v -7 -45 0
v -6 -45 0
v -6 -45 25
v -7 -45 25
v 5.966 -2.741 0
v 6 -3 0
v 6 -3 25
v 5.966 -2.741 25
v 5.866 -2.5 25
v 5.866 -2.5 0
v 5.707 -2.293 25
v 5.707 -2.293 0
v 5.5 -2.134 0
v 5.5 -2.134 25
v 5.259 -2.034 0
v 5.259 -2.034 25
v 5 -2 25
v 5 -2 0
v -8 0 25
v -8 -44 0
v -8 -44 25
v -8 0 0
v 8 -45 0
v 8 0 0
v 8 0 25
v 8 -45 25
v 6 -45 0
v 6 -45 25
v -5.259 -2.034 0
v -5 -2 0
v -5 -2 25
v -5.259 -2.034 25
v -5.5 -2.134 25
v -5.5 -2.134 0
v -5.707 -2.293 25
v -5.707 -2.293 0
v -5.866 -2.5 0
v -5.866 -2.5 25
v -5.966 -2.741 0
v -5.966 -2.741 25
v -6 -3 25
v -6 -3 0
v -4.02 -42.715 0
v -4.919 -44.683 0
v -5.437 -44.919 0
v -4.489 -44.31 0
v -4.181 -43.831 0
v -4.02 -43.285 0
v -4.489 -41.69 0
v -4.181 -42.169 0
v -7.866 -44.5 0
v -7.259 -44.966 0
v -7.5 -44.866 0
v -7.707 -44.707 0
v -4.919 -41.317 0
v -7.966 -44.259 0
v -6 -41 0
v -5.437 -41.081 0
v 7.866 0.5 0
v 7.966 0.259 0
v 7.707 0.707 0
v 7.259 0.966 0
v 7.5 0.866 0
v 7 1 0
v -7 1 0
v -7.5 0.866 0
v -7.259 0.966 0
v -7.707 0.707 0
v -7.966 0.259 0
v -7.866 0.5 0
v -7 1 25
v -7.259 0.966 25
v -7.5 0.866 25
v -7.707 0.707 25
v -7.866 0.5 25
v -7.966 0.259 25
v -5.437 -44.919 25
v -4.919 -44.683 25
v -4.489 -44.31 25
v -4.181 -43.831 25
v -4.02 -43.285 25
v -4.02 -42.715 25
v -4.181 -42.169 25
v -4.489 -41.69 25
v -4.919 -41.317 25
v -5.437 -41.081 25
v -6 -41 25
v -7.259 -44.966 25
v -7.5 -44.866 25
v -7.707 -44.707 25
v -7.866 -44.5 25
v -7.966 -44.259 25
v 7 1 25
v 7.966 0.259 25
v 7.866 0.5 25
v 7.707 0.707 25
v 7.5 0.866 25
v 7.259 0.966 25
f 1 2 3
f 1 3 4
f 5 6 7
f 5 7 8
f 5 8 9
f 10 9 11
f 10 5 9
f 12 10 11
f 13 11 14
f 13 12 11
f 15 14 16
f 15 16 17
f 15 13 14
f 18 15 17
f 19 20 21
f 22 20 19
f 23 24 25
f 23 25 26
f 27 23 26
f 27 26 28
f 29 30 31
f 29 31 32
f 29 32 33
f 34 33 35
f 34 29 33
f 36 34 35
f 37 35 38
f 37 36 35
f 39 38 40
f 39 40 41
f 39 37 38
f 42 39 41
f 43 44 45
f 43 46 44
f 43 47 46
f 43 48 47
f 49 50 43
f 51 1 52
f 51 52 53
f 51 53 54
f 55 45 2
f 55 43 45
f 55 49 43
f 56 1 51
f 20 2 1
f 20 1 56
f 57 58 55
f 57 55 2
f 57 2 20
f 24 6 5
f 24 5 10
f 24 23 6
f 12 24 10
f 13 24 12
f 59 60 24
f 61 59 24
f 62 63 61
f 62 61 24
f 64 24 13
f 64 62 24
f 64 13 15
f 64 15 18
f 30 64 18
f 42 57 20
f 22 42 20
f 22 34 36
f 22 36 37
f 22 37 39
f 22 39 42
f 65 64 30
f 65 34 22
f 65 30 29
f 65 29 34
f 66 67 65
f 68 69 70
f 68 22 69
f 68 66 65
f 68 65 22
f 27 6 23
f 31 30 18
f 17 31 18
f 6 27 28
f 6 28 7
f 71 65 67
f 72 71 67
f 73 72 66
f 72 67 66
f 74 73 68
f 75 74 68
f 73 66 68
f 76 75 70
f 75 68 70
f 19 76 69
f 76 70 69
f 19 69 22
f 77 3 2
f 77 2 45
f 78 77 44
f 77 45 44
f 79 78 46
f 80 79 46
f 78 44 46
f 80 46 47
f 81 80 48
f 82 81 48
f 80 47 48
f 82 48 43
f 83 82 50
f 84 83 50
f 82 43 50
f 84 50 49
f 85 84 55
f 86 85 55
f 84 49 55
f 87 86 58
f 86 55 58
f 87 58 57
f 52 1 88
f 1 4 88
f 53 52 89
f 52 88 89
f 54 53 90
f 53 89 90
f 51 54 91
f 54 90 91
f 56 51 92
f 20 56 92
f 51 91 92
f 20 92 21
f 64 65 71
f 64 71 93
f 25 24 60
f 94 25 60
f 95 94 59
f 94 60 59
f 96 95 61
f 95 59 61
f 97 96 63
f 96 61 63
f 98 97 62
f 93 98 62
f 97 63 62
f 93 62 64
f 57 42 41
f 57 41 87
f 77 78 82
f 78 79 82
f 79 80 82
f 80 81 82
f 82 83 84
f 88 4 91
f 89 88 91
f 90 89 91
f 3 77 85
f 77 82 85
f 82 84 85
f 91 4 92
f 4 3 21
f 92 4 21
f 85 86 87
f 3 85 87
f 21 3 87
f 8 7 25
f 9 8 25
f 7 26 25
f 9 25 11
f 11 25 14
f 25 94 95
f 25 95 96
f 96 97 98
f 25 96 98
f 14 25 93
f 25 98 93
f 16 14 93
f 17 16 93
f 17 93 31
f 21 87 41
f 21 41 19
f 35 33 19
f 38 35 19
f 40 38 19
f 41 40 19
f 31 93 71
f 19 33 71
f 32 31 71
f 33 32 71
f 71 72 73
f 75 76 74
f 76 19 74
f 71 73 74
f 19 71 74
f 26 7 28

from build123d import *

# Parameters (mm, degrees)
PAD_DEPTH = 25
FILLET_R  = 1


with BuildPart() as part:
    # Sketch → Pad (new body)
    with BuildSketch(Plane.XY):
        with BuildLine():
            Line((8, 0), (8, -45))
            Line((8, -45), (6, -45))
            Line((6, -45), (6, -3))
            ThreePointArc((6, -3), (5.707107, -2.292893), (5, -2))
            Line((-5, -2), (5, -2))
            ThreePointArc((-5, -2), (-5.707107, -2.292893), (-6, -3))
            Line((-6, -3), (-6, -41))
            ThreePointArc((-6, -45), (-4, -43), (-6, -41))
            Line((-6, -45), (-8, -45))
            Line((-8, -45), (-8, 0))
            ThreePointArc((-7, 1), (-7.707107, 0.707107), (-8, 0))
            Line((-7, 1), (7, 1))
            ThreePointArc((8, 0), (7.707107, 0.707107), (7, 1))
        make_face()
    extrude(amount=PAD_DEPTH)

    # Fillet
    fillet_edges = [part.edges().sort_by_distance(p)[0] for p in [
        (-8, -45, 12.5),
    ]]
    fillet(fillet_edges, radius=FILLET_R)


solid = part.part
